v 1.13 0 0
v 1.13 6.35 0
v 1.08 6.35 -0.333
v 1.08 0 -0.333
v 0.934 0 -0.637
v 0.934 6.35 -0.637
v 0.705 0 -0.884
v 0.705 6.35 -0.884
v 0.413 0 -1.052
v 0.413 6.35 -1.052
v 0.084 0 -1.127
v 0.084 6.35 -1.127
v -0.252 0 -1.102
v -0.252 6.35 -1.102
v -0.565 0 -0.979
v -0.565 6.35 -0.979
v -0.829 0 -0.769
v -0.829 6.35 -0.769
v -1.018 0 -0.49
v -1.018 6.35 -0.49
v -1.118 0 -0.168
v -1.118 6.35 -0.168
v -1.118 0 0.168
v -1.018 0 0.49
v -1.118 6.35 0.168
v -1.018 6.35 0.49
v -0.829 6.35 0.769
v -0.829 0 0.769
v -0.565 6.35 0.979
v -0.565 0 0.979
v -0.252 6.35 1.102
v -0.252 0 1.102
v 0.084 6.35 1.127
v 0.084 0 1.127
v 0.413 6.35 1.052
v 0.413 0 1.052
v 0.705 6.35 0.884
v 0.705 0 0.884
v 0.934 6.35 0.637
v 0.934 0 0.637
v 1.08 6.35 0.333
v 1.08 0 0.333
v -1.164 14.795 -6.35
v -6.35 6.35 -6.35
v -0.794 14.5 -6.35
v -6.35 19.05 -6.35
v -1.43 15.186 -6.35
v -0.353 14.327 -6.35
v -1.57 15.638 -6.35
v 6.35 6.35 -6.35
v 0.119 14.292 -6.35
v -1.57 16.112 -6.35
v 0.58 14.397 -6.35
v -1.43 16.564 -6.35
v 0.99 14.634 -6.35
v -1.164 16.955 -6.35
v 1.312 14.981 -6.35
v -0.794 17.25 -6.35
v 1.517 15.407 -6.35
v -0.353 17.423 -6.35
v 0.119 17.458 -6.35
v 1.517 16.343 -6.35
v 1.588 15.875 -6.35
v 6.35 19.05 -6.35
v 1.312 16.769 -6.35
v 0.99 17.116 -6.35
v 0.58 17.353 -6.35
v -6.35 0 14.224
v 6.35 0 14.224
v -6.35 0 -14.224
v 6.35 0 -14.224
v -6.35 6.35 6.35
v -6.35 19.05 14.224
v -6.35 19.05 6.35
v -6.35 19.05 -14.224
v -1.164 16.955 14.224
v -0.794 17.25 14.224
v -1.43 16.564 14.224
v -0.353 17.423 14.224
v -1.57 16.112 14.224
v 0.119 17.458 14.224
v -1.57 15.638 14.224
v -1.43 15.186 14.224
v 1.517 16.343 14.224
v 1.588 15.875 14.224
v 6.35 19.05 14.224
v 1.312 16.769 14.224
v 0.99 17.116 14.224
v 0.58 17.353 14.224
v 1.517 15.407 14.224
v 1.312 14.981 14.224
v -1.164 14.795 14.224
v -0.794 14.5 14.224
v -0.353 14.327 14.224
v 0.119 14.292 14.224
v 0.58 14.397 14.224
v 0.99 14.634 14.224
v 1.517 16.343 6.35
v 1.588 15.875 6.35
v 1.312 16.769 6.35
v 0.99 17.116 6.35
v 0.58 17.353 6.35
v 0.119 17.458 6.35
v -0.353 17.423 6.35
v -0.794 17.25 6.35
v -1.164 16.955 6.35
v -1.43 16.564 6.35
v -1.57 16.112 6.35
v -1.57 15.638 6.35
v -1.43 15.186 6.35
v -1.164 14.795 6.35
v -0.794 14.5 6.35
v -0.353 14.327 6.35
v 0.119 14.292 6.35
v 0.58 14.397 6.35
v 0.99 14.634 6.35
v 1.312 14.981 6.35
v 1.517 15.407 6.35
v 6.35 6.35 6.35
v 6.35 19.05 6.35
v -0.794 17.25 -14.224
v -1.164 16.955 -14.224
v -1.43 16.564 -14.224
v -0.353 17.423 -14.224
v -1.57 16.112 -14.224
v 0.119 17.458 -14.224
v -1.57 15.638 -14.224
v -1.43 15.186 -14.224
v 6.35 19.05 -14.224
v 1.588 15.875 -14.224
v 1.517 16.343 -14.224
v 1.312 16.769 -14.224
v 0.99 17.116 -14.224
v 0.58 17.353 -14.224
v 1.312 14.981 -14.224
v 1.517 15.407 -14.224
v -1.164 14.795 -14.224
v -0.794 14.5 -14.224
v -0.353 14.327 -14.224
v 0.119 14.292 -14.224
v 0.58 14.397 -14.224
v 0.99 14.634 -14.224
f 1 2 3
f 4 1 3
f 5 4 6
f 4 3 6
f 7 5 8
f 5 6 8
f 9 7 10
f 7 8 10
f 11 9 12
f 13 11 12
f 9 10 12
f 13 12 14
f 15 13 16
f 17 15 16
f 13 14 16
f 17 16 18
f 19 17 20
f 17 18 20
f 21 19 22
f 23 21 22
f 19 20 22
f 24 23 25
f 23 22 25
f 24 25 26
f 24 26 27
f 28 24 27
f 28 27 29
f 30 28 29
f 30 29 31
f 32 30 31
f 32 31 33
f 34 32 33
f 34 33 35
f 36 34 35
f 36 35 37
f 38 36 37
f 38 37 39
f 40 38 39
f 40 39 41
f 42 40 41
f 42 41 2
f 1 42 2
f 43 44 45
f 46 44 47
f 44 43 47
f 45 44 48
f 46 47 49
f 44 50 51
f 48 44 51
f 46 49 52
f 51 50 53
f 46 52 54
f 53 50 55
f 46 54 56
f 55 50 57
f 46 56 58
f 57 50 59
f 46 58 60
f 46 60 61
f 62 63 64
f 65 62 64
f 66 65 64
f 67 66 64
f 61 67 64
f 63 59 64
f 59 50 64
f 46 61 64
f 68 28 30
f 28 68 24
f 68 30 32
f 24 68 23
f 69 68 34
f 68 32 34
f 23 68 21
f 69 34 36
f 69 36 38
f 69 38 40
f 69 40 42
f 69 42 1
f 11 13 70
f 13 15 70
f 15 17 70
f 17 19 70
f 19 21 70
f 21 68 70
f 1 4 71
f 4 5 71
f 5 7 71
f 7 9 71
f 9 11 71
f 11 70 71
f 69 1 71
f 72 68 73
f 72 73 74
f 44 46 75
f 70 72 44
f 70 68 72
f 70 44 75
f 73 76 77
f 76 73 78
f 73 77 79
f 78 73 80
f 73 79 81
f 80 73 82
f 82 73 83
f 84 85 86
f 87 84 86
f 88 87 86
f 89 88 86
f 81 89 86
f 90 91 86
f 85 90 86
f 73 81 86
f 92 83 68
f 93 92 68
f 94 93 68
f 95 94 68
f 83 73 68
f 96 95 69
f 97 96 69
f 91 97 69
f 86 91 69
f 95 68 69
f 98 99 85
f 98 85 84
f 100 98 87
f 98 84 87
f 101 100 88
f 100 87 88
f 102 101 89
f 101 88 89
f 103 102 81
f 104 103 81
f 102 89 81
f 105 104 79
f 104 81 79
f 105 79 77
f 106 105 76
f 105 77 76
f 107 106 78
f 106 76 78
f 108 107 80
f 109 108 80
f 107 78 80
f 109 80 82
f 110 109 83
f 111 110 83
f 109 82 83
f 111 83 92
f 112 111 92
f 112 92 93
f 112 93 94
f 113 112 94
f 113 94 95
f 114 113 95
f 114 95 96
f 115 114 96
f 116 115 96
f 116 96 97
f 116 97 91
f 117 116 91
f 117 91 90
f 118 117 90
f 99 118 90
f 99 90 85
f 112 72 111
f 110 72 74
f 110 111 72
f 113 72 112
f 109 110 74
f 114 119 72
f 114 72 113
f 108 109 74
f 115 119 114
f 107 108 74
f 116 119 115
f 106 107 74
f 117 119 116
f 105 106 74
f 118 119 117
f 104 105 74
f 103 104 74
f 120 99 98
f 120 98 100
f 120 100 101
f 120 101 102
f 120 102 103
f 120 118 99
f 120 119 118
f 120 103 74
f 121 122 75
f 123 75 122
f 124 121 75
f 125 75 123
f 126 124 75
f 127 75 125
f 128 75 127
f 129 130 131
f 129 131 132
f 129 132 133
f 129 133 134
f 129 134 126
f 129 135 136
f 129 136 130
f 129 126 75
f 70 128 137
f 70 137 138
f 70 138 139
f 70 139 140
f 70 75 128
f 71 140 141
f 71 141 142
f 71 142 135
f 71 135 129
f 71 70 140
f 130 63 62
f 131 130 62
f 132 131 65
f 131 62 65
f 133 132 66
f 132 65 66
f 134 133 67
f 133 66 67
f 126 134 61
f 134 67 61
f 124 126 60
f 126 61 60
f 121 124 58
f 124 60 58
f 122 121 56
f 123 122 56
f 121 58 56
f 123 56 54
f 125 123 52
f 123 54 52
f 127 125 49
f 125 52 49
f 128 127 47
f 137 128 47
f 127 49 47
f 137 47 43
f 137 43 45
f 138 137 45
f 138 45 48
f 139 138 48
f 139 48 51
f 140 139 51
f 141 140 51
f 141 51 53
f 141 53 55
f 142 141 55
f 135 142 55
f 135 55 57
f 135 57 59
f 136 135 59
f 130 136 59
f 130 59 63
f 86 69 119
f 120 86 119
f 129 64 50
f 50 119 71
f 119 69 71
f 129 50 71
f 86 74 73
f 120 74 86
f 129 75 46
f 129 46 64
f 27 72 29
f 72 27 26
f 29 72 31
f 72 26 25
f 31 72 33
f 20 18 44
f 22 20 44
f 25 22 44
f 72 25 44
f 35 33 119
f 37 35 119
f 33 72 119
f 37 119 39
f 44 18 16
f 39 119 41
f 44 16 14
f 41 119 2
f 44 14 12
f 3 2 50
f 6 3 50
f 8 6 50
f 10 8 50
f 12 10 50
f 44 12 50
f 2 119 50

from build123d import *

# Parameters (mm, degrees)
SKETCH1_W             = 12.7
SKETCH1_H             = 28.448
BOSS_EXTRUDE1_DEPTH   = 19.05
SKETCH2_W             = 12.7
SKETCH2_H             = 12.7
CUT_EXTRUDE1_DEPTH    = 27.953936188
SKETCH5_R             = 1.5875
CUT_EXTRUDE2_DEPTH    = 35.82116747
F_4_40_TAPPED_HOLE1_D = 2.2606


with BuildPart() as part:
    # Sketch1 → Boss-Extrude1 (new body)
    with BuildSketch(Plane(origin=(0, 0, 0), x_dir=(1, 0, 0), z_dir=(0, 1, 0))):
        Rectangle(SKETCH1_W, SKETCH1_H)
    extrude(amount=BOSS_EXTRUDE1_DEPTH)

    # Sketch2 → Cut-Extrude1 (cut, through all)
    with BuildSketch(Plane(origin=(6.35, 0, 0), x_dir=(0, 0, -1), z_dir=(1, 0, 0))):
        with Locations((0, 12.7)):
            Rectangle(SKETCH2_W, SKETCH2_H)
    extrude(amount=-CUT_EXTRUDE1_DEPTH, mode=Mode.SUBTRACT)

    # Sketch5 → Cut-Extrude2 (cut, through all)
    with BuildSketch(Plane.XY.offset(14.224)):
        with Locations((0, 15.875)):
            Circle(SKETCH5_R)
    extrude(amount=-CUT_EXTRUDE2_DEPTH, mode=Mode.SUBTRACT)

    # #4-40 Tapped Hole1 (through all)
    with Locations(Plane(origin=(0, 0, 0), x_dir=(-1, 0, 0), z_dir=(0, -1, 0))):
        with Locations((0, 0)):
            Hole(F_4_40_TAPPED_HOLE1_D / 2)


solid = part.part
